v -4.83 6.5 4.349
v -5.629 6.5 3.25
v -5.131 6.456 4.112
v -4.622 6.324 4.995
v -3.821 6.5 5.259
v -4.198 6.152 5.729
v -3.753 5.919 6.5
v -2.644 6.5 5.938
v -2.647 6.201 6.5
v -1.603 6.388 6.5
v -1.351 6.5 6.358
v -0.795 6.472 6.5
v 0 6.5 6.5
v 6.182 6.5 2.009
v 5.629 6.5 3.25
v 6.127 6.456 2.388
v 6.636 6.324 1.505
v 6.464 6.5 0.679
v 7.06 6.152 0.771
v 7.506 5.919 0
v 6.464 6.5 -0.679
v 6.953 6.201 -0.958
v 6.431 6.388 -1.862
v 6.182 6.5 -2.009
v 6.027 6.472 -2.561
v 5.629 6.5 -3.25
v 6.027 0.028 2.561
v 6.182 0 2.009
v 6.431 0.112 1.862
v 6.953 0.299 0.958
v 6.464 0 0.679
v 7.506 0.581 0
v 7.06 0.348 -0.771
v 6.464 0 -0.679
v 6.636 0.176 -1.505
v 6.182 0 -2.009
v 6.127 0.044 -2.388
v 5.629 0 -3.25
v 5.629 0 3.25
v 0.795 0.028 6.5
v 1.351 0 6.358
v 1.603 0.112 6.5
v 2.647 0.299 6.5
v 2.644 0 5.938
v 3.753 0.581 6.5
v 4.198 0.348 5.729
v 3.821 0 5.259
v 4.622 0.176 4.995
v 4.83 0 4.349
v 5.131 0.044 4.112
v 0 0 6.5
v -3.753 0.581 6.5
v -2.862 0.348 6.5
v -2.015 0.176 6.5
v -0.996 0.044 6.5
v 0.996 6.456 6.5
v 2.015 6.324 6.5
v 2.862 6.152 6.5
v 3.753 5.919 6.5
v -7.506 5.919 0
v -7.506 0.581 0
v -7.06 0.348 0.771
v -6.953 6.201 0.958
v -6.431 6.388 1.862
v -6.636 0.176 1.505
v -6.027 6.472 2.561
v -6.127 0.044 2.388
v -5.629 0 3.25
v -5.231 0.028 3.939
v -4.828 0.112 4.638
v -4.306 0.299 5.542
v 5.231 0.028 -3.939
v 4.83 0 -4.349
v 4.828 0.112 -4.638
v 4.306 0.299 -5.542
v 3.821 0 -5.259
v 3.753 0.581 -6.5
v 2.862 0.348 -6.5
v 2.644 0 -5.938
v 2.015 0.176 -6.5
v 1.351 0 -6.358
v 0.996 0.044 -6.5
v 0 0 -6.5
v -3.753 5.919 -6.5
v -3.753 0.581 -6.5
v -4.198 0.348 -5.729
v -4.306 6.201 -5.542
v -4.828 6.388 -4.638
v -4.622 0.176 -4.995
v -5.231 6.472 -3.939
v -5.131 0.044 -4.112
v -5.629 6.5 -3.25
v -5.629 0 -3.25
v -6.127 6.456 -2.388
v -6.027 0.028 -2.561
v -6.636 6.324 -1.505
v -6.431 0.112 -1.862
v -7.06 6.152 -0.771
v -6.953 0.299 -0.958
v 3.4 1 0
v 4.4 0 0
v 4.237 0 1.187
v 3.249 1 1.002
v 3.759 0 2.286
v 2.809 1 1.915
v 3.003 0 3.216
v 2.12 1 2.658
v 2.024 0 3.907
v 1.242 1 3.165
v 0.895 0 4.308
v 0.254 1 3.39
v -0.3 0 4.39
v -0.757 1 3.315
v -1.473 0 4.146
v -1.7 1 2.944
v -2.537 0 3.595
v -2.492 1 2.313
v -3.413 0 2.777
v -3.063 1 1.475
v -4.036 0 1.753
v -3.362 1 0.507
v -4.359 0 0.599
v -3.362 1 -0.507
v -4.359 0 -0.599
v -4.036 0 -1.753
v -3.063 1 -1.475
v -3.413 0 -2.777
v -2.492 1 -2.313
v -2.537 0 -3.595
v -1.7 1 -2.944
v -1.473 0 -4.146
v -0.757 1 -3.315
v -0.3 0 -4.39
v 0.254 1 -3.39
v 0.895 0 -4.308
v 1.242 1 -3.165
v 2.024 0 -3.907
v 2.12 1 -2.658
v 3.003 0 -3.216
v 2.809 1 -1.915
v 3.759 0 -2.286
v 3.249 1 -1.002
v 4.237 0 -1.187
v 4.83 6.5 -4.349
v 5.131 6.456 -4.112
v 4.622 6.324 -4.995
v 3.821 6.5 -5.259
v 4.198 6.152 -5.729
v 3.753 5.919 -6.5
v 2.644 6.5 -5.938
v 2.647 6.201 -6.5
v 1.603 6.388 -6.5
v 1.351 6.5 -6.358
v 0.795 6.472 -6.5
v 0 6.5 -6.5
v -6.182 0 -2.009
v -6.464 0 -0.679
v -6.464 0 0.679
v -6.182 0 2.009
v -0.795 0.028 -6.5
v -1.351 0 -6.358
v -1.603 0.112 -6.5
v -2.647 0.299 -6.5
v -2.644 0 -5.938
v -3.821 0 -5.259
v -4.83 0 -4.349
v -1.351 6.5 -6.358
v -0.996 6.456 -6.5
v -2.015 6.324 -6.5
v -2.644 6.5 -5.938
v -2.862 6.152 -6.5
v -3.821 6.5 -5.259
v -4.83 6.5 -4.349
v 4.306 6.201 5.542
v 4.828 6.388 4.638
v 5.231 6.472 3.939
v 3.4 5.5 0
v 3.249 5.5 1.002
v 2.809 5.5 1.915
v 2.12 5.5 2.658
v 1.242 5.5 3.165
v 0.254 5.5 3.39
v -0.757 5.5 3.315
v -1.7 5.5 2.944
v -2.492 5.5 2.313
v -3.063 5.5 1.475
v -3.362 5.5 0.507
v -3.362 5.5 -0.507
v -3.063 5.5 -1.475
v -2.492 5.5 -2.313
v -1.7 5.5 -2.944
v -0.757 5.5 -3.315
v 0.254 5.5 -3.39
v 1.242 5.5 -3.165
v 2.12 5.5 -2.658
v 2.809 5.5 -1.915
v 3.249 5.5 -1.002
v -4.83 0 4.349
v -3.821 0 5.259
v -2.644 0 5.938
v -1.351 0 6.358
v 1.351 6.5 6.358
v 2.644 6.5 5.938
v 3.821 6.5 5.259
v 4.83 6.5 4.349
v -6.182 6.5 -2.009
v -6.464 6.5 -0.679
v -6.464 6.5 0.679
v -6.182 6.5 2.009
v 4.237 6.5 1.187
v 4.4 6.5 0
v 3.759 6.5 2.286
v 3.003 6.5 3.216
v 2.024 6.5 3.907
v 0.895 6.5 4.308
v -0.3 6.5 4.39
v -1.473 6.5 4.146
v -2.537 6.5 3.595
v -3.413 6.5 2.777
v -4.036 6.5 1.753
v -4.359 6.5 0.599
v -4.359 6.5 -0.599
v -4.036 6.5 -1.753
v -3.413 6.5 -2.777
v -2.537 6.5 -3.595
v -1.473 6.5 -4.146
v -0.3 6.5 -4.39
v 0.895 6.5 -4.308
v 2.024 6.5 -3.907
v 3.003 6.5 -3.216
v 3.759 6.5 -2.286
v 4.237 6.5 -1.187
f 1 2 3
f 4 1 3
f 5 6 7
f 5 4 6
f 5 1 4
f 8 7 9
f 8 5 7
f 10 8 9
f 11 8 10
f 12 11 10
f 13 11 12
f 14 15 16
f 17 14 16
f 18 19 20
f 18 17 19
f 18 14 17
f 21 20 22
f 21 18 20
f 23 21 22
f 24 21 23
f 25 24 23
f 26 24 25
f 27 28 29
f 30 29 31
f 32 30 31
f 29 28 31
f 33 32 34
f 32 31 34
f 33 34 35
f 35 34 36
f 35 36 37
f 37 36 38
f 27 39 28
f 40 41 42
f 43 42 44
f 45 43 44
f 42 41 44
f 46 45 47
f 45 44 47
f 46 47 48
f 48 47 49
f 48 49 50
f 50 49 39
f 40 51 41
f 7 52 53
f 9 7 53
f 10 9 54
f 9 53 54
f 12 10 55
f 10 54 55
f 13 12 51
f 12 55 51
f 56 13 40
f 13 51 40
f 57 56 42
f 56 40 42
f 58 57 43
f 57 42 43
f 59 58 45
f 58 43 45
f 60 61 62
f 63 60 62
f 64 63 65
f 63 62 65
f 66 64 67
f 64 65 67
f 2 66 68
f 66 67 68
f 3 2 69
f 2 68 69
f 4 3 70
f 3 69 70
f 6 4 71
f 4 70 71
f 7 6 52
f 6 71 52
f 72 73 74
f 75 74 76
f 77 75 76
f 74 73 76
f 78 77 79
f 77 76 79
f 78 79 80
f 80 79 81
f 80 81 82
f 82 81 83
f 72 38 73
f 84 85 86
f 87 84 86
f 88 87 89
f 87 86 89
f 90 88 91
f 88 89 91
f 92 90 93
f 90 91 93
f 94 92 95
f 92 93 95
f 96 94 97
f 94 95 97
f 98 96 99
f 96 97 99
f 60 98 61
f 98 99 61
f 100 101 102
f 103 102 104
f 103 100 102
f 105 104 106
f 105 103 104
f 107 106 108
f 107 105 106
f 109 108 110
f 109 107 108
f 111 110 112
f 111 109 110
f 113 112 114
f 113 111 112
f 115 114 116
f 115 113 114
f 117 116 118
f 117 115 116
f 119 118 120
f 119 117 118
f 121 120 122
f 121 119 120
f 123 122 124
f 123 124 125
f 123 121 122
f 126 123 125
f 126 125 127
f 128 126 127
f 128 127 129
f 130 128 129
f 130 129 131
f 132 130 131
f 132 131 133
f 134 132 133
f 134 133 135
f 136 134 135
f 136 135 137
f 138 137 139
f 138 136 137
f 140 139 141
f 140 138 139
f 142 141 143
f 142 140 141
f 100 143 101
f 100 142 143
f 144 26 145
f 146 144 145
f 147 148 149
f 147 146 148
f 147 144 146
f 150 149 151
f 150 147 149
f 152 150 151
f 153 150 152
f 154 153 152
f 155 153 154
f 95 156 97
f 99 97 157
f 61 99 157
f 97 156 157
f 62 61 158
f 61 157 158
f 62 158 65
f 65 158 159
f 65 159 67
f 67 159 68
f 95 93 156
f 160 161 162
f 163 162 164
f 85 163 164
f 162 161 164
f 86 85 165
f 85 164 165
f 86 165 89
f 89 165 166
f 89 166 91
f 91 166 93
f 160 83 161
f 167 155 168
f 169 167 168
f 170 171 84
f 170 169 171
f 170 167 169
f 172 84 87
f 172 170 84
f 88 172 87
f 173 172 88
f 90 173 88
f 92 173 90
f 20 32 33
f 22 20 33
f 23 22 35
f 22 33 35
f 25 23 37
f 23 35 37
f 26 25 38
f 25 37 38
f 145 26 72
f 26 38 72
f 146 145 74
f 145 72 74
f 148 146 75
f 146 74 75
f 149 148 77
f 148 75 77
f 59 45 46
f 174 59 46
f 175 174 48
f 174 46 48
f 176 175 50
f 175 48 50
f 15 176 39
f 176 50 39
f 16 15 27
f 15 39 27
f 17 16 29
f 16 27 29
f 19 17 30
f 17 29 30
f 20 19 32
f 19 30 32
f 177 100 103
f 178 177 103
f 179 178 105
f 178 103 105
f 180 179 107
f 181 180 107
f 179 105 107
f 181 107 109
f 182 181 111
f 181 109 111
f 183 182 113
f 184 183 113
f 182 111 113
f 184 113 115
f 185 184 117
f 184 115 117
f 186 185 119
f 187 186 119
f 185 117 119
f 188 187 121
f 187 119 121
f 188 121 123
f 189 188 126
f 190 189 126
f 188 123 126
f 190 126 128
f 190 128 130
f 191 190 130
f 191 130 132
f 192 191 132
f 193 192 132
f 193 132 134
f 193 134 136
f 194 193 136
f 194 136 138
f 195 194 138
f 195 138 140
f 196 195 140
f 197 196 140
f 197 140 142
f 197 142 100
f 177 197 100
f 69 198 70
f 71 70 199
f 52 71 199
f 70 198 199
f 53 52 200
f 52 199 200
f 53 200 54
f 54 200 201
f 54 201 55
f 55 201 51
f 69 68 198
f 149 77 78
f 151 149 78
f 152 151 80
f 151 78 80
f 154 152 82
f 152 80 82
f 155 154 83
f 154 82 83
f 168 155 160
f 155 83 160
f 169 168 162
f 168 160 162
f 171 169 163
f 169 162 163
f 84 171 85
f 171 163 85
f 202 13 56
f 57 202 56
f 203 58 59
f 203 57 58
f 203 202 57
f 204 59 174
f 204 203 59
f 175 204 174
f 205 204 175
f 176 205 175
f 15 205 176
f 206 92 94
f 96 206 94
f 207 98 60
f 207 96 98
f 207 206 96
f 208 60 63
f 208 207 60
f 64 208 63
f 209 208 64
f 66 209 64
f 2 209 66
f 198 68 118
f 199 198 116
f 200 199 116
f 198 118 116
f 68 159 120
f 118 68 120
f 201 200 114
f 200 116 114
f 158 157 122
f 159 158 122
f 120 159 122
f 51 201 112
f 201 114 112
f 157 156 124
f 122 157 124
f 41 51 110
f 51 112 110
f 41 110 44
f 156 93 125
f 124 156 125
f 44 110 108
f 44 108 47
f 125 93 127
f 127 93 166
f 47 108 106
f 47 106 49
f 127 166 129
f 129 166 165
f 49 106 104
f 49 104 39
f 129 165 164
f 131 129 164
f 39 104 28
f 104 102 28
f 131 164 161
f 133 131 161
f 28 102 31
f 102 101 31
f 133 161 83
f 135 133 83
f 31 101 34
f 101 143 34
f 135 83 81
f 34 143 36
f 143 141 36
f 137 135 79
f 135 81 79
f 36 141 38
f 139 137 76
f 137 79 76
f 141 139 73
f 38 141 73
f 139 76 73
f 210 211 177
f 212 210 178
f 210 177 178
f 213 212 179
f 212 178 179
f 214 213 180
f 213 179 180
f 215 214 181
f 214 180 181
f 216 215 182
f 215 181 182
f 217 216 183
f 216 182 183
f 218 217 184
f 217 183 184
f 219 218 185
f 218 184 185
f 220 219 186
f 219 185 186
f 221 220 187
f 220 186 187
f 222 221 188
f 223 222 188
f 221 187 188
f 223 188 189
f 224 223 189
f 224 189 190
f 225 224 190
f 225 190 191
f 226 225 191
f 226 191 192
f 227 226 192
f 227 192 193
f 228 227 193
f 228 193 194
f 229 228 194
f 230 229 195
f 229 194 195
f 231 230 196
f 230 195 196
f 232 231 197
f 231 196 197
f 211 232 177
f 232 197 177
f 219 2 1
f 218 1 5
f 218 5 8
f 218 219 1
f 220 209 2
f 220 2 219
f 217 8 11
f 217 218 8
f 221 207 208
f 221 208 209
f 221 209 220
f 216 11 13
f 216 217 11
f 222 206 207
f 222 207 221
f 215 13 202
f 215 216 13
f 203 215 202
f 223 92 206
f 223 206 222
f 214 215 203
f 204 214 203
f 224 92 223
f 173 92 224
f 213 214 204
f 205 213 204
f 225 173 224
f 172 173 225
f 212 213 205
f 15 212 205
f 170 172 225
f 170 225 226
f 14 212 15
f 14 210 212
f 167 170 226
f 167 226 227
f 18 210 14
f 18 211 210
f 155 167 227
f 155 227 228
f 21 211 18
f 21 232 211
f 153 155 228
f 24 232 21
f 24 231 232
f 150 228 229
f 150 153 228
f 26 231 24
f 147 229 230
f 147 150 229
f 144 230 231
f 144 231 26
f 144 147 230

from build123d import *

# Parameters (mm, degrees)
BOSS_EXTRUDE1_DEPTH = 6.5
M8_TAPPED_HOLE1_D   = 6.8
CHAMFER1_SIZE       = 1


with BuildPart() as part:
    # Sketch1 → Boss-Extrude1 (new body)
    with BuildSketch(Plane(origin=(0, 0, 0), x_dir=(1, 0, 0), z_dir=(0, 1, 0))):
        Polygon((3.75277675, 6.5), (-3.75277675, 6.5), (-7.505553499, 0), (-3.75277675, -6.5), (3.75277675, -6.5), (7.505553499, 0), align=None)
    extrude(amount=BOSS_EXTRUDE1_DEPTH)

    # Sketch2 → Cut-Revolve1 (revolve, cut)
    with BuildSketch(Plane(origin=(0, 0, 0), x_dir=(0, 0, -1), z_dir=(1, 0, 0))):
        Polygon((-9.964101615, 6.5), (-9.964101615, 4.5), (-6.5, 6.5), align=None)
        Polygon((-9.964101615, 2), (-6.5, 0), (-9.964101615, 0), align=None)
    revolve(axis=Axis((0, 0, 0), (0, 1, 0)), mode=Mode.SUBTRACT)

    # M8 Tapped Hole1 (through all)
    with Locations(Plane(origin=(0, 6.5, 0), x_dir=(-1, 0, 0), z_dir=(0, 1, 0))):
        with Locations((0, 0)):
            Hole(M8_TAPPED_HOLE1_D / 2)

    # Chamfer1
    chamfer1_edges = [part.edges().sort_by_distance(p)[0] for p in [
        (-3.4, 6.5, 0),
        (-3.4, 0, 0),
    ]]
    chamfer(chamfer1_edges, length=CHAMFER1_SIZE)


solid = part.part
